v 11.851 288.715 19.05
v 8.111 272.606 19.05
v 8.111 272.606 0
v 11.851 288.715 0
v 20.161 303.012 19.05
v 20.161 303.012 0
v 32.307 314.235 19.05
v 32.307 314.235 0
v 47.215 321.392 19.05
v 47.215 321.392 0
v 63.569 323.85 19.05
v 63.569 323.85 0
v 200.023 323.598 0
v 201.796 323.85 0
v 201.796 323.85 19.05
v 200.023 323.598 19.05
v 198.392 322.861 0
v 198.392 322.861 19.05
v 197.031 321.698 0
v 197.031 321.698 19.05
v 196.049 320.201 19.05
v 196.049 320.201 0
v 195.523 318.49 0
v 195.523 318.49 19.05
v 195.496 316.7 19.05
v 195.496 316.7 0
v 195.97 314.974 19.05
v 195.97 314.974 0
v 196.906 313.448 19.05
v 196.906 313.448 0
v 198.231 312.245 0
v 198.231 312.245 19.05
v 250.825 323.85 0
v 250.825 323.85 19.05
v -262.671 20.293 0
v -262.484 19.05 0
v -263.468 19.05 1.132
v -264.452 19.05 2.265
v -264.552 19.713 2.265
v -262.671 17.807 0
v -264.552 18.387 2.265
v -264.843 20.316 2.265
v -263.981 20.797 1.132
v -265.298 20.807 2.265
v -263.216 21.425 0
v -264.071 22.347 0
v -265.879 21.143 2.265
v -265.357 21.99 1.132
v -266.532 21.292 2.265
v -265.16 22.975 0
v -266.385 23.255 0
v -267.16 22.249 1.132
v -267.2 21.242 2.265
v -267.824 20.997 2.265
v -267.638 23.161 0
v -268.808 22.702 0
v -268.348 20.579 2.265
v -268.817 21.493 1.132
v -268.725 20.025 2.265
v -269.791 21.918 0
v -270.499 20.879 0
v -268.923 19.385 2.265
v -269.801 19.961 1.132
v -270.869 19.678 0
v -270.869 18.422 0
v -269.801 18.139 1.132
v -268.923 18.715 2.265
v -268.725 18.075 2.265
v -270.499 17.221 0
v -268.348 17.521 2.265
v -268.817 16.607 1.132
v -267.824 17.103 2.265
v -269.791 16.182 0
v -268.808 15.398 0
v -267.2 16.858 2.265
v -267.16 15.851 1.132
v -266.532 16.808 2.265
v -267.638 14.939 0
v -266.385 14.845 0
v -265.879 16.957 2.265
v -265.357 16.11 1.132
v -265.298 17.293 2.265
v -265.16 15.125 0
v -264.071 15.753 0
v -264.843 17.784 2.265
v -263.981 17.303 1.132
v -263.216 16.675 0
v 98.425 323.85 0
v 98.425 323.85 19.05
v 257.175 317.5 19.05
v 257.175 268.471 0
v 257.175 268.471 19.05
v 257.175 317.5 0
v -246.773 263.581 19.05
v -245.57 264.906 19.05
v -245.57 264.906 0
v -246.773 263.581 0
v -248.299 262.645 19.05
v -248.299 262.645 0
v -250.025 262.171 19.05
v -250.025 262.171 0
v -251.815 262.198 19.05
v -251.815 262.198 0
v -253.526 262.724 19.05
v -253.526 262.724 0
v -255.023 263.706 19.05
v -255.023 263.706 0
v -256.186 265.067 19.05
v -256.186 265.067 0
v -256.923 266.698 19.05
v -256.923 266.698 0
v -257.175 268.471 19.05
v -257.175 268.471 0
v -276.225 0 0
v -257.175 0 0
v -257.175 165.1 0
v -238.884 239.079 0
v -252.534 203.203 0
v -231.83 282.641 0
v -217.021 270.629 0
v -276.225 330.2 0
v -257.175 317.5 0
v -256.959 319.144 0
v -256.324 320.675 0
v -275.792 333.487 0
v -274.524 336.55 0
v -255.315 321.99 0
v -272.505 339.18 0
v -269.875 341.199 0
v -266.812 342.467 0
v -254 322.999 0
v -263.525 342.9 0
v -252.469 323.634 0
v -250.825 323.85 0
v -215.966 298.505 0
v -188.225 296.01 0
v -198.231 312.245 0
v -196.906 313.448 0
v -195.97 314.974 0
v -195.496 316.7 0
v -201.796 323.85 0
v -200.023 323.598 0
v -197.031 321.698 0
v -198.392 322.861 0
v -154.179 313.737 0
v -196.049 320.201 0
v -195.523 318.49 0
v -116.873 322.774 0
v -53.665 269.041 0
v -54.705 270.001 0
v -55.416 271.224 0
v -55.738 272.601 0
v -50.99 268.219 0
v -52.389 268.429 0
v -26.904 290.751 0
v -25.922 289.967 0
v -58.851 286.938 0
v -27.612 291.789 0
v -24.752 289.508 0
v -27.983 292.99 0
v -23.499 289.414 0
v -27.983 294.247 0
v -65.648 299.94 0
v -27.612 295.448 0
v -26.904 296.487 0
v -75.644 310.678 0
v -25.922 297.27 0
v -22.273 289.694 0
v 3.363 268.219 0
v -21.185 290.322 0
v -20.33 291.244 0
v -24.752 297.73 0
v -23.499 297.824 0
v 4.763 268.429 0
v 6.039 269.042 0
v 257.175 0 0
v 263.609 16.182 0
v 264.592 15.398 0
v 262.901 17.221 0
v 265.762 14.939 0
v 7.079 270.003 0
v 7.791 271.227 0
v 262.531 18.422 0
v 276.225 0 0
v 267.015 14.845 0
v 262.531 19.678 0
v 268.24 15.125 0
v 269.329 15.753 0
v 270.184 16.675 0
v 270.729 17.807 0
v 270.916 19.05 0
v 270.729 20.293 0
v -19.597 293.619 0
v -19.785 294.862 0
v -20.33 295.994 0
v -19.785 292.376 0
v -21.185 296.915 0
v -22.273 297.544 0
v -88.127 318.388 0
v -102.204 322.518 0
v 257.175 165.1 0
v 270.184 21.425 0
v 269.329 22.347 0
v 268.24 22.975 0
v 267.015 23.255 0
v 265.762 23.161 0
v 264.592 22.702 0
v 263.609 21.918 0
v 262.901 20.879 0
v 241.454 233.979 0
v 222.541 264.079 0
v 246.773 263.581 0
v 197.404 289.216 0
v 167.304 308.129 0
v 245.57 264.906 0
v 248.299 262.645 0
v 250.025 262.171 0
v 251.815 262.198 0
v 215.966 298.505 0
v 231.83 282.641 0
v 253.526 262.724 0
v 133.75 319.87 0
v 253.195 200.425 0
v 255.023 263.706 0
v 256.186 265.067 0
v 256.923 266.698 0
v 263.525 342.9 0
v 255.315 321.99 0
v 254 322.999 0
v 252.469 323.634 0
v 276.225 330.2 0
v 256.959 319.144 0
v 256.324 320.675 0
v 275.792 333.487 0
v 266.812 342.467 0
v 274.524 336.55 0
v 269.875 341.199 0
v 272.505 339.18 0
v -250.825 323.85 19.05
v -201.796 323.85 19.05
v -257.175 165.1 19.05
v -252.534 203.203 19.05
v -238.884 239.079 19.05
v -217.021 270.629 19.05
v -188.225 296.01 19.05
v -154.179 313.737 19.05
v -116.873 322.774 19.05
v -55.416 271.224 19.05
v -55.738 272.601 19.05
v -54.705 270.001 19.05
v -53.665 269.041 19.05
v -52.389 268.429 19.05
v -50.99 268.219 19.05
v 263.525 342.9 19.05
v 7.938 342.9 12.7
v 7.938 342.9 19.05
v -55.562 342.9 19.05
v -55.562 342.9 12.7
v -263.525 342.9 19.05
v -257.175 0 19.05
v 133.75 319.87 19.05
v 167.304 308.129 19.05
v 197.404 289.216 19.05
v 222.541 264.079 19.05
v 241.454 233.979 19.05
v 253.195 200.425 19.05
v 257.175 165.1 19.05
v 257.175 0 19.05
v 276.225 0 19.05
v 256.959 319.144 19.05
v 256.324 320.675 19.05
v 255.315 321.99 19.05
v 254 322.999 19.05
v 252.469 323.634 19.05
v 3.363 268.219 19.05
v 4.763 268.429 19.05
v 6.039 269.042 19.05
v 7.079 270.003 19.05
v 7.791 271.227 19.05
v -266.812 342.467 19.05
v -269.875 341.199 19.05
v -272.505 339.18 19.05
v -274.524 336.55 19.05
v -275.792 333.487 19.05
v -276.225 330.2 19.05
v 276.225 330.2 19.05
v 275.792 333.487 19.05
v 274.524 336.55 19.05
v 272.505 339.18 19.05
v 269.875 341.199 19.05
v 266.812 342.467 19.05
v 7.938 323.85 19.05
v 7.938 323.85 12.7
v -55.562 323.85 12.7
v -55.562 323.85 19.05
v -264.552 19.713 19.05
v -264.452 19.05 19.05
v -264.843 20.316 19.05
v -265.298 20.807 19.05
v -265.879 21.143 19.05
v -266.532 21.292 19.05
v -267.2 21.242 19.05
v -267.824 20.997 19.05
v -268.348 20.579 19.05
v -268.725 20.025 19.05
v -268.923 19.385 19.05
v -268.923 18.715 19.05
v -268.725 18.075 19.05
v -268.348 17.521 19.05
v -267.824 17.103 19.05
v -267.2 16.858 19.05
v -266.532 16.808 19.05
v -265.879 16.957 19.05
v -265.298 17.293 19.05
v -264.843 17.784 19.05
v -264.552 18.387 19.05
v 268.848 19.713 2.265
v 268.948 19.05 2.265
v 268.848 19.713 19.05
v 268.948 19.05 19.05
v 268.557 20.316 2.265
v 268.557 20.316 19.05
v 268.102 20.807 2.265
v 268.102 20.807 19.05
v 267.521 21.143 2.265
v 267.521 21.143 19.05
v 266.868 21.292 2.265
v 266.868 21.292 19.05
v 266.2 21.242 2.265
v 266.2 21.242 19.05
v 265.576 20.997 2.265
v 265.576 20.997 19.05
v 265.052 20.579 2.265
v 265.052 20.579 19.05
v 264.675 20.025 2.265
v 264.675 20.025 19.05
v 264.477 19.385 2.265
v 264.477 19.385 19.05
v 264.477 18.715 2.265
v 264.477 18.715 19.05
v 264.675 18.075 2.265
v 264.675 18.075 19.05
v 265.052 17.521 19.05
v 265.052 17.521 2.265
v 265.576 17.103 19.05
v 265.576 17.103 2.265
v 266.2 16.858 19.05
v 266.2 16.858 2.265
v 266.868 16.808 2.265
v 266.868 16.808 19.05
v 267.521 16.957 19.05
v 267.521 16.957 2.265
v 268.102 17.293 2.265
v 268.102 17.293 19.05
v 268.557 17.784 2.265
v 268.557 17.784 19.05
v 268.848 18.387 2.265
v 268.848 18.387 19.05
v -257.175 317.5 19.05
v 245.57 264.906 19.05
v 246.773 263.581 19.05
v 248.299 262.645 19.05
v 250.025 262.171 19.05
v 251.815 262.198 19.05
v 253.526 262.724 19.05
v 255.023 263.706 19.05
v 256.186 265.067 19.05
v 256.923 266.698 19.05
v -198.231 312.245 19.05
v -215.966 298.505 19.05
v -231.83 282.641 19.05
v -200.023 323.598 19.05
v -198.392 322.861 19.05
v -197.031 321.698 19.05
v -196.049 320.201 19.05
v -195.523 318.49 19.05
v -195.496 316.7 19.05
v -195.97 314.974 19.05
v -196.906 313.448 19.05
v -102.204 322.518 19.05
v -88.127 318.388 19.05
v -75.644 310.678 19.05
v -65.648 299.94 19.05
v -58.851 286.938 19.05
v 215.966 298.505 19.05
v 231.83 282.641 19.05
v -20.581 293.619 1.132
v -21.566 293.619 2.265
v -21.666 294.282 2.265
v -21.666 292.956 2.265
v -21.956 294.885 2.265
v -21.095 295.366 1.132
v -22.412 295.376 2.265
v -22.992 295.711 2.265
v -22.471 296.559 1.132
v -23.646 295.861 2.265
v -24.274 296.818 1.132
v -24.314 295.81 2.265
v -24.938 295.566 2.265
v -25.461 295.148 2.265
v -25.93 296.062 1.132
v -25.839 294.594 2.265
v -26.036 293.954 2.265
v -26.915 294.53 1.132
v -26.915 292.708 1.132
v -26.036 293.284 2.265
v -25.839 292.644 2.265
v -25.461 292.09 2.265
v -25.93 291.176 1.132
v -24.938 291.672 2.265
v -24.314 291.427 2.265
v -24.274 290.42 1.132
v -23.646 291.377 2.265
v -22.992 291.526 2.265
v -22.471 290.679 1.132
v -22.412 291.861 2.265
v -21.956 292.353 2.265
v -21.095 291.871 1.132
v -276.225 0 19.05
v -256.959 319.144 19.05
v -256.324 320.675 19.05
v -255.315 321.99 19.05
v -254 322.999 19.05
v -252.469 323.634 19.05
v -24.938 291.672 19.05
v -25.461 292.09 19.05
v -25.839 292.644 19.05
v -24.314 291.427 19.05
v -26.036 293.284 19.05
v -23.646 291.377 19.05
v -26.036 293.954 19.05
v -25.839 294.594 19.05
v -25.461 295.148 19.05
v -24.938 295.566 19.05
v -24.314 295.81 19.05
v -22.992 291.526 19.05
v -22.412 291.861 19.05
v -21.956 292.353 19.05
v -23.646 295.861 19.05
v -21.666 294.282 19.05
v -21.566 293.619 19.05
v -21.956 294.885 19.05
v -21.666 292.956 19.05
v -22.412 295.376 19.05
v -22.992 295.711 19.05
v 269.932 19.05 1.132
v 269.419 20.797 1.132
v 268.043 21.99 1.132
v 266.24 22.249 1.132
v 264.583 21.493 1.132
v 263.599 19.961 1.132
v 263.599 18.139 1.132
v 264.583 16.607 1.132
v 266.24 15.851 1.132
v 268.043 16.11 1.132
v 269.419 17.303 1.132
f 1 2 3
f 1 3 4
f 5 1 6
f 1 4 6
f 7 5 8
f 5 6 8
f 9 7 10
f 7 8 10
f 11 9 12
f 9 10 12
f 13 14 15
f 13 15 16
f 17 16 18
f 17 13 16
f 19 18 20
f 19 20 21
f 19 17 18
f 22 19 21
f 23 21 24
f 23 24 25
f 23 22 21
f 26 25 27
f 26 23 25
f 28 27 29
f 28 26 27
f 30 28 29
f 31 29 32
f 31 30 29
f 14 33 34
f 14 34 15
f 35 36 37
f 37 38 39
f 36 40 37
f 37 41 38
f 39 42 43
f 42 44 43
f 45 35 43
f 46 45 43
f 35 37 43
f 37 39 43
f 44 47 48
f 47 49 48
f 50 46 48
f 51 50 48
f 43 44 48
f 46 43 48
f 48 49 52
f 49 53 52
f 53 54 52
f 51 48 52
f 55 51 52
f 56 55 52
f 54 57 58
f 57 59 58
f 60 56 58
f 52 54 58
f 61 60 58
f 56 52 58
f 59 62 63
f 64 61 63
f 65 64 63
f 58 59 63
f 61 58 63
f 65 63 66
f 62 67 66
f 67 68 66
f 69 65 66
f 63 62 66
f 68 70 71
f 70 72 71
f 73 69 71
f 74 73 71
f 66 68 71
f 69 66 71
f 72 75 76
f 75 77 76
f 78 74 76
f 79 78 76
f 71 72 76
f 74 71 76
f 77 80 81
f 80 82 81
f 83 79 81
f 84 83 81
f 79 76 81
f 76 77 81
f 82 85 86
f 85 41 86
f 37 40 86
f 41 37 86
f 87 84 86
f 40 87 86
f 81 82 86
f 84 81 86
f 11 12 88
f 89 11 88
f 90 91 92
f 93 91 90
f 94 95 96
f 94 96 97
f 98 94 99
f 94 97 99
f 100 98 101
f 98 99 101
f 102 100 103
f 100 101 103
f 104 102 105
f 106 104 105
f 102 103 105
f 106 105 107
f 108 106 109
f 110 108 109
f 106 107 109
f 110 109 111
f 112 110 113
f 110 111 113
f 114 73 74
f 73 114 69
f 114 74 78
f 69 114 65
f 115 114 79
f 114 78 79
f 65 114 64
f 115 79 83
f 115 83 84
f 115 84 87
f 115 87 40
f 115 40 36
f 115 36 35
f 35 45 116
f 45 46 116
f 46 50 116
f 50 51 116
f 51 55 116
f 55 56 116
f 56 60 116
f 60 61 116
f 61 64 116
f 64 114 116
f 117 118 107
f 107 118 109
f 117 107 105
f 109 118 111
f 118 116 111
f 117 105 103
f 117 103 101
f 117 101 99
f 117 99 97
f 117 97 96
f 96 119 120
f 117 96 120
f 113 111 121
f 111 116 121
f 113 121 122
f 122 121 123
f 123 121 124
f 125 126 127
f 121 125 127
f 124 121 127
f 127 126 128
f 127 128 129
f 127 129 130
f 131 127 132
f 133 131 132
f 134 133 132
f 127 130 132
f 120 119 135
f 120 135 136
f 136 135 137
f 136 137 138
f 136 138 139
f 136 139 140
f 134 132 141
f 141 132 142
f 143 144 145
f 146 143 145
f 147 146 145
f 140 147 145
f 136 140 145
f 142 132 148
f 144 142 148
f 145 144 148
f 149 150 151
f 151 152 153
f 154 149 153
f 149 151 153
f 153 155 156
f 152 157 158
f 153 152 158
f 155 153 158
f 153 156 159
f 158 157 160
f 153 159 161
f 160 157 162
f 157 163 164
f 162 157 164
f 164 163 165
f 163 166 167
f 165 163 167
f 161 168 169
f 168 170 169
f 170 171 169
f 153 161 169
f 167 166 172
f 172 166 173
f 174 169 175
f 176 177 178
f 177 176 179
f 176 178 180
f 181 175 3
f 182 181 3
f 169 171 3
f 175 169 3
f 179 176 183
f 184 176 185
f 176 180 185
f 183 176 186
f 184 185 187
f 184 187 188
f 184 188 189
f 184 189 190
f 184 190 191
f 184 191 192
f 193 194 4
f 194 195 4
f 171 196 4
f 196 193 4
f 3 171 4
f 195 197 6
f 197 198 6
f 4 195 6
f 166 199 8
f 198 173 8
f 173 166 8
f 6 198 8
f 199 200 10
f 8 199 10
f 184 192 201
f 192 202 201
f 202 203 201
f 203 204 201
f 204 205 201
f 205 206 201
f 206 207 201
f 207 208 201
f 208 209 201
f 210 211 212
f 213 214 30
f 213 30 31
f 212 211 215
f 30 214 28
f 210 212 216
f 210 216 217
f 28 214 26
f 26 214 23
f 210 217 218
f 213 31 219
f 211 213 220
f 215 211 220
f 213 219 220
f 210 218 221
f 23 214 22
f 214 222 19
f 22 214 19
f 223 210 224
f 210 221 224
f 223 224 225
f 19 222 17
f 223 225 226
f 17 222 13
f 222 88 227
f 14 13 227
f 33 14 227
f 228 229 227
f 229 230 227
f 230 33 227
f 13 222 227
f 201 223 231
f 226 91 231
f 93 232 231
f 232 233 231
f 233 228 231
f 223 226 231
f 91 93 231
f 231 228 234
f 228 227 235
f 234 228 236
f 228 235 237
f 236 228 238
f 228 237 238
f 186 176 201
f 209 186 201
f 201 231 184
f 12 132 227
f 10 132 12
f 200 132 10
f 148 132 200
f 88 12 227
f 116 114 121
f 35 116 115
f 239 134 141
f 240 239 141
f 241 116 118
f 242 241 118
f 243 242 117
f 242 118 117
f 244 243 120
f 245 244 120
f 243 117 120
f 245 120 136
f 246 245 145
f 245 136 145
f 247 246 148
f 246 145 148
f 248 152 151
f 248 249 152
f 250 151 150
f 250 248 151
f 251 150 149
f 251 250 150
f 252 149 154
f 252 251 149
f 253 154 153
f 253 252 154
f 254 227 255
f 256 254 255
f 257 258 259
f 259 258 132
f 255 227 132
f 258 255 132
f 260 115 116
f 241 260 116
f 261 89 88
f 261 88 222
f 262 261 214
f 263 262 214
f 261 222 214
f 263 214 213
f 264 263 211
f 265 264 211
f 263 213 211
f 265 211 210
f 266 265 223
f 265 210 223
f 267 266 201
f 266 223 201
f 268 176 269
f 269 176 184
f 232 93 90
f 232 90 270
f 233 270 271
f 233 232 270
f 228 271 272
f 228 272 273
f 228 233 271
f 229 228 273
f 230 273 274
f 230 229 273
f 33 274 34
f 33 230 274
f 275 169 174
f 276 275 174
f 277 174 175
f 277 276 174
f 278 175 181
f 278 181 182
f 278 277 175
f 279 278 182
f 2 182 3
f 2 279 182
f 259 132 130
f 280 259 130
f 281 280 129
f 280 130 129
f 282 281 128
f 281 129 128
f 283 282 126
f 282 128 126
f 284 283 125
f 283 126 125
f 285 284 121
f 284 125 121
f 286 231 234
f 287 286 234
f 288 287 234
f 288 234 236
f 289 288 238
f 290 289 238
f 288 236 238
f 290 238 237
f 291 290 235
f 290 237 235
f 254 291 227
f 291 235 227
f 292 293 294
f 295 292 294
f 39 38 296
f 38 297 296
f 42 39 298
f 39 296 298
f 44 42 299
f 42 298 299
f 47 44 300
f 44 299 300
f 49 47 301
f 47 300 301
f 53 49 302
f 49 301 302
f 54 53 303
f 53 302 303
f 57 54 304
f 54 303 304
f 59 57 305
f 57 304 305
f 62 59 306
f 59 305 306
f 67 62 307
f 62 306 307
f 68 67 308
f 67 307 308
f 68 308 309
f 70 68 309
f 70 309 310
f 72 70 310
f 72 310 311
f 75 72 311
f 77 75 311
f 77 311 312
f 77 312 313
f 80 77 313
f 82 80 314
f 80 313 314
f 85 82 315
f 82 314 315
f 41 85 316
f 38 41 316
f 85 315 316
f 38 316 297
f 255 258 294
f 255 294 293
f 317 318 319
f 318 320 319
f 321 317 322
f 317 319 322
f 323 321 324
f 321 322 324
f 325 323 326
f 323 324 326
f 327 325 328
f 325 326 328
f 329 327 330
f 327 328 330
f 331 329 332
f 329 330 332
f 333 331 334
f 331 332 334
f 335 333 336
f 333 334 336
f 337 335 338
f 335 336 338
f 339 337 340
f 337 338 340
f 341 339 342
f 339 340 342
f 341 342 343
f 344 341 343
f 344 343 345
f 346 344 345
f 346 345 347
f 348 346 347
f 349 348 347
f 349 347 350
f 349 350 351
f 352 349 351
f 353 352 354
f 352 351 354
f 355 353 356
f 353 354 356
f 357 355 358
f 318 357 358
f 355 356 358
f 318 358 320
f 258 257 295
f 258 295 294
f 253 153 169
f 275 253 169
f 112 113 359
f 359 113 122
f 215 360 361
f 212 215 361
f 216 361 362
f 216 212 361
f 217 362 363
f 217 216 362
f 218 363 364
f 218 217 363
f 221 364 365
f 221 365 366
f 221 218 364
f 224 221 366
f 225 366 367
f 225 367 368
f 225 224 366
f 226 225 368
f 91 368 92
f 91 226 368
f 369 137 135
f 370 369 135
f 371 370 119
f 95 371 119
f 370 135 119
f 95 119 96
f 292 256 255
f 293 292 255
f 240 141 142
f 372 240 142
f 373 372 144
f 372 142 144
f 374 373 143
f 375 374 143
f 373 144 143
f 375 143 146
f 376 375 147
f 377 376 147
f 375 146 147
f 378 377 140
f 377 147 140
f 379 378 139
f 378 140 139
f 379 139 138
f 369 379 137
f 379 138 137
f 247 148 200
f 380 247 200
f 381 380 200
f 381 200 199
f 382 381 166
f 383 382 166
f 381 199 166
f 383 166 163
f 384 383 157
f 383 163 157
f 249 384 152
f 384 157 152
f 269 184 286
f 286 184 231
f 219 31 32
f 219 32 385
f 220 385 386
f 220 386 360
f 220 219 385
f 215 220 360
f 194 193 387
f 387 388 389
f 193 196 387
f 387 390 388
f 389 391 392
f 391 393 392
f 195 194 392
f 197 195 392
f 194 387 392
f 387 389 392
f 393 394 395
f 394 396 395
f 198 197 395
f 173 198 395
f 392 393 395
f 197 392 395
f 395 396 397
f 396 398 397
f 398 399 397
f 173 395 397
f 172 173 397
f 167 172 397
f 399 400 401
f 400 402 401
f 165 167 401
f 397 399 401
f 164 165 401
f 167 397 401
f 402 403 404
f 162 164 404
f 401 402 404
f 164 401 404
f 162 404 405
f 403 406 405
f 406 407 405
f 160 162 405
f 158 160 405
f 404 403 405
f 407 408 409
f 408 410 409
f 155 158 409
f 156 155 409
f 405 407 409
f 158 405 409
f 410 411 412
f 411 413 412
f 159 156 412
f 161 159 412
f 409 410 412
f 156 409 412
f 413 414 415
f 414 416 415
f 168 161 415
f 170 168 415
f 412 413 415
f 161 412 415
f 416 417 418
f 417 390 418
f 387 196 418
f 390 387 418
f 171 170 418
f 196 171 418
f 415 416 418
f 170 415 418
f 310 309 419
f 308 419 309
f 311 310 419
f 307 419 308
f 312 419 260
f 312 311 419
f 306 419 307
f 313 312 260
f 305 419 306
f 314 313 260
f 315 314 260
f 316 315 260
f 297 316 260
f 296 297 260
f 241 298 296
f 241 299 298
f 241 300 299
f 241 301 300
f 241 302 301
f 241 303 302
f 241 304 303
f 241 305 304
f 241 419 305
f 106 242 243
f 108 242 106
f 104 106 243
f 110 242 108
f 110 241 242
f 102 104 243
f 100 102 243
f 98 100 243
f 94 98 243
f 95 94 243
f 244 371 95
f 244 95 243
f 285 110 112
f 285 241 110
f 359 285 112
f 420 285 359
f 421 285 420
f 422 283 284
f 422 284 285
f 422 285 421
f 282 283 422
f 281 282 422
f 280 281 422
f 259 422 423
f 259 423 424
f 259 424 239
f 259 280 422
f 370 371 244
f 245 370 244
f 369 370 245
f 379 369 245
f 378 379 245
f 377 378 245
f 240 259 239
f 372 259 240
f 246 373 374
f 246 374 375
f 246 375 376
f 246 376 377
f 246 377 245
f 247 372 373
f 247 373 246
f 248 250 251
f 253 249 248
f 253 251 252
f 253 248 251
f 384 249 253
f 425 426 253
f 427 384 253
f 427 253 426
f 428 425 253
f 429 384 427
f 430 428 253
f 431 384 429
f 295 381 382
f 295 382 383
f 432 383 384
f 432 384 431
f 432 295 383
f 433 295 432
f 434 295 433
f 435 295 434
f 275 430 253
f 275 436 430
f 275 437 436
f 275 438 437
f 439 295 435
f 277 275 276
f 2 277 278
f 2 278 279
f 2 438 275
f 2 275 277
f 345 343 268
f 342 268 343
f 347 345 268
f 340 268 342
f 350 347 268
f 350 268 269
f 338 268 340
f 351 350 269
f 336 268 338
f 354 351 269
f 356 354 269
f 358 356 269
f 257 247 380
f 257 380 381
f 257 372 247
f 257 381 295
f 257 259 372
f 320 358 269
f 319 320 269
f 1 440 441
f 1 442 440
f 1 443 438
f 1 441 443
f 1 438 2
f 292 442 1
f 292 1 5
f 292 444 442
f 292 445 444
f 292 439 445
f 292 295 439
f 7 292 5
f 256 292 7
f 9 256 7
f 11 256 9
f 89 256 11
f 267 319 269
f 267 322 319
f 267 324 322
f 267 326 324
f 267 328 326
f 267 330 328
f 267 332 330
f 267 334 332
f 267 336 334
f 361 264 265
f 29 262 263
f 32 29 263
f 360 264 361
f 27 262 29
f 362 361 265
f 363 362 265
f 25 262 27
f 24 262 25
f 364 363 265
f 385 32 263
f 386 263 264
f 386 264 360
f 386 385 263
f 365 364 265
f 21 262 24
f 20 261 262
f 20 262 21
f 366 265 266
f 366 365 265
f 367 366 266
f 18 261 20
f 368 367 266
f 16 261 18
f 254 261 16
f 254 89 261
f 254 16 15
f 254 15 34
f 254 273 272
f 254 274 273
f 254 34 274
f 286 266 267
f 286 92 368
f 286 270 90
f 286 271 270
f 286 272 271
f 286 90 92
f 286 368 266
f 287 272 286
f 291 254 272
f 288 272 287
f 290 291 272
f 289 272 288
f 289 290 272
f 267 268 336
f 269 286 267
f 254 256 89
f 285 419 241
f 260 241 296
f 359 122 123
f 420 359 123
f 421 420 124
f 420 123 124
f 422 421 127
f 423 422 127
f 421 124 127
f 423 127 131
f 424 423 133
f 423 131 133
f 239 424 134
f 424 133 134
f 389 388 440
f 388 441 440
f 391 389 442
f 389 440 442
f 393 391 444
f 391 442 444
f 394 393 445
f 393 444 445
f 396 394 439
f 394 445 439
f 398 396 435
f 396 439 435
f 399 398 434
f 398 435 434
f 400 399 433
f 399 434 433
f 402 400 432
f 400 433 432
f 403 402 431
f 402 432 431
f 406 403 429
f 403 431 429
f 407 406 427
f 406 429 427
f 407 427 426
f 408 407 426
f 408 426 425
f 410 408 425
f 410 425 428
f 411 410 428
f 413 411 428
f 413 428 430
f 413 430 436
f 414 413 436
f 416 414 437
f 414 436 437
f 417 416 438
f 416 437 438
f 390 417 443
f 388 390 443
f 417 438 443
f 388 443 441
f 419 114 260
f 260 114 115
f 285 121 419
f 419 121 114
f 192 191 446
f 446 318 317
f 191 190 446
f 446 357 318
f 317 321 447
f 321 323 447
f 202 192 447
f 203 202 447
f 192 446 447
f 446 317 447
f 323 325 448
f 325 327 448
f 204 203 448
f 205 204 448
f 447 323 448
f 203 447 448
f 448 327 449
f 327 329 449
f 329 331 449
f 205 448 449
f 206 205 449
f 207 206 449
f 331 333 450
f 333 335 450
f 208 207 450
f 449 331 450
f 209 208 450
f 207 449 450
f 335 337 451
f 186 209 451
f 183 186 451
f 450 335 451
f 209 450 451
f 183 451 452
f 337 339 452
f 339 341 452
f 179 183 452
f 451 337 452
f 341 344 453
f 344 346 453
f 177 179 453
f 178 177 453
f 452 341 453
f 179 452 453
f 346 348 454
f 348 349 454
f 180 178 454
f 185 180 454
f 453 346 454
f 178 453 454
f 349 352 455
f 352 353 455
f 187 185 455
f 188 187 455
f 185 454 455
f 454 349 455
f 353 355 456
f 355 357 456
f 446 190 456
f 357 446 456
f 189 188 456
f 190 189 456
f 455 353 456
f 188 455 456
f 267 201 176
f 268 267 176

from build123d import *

# Parameters (mm, degrees)
BOSS_EXTRUDE1_DEPTH                            = 19.05
SKETCH2_W                                      = 63.5
SKETCH2_H                                      = 6.35
CUT_EXTRUDE1_DEPTH                             = 441.730714978
BOSS_EXTRUDE3_DEPTH                            = 19.05
FILLET1_R                                      = 4.7625
CSK_FOR_8_FLAT_HEAD_MACHINE_SCREW1_D           = 4.4958
CSK_FOR_8_FLAT_HEAD_MACHINE_SCREW1_DEPTH       = 30.1752
CSK_FOR_8_FLAT_HEAD_MACHINE_SCREW1_CSINK_D     = 8.4328
CSK_FOR_8_FLAT_HEAD_MACHINE_SCREW1_CSINK_ANGLE = 82
CSK_FOR_8_FLAT_HEAD_MACHINE_SCREW1_TIP         = 1.350674586


with BuildPart() as part:
    # Sketch1 → Boss-Extrude1 (new body)
    with BuildSketch(Plane.XY):
        with BuildLine():
            Line((276.225, 0), (276.225, 330.2))
            ThreePointArc((276.225, 330.2), (272.505256121, 339.180256121), (263.525, 342.9))
            Line((263.525, 342.9), (-263.525, 342.9))
            ThreePointArc((-263.525, 342.9), (-272.505256121, 339.180256121), (-276.225, 330.2))
            Line((-276.225, 330.2), (-276.225, 0))
            Line((-276.225, 0), (-257.175, 0))
            Line((-257.175, 0), (-257.175, 76.2))
            Line((-257.175, 76.2), (-257.175, 165.1))
            ThreePointArc((-257.175, 165.1), (-210.678201513, 277.353201513), (-98.425, 323.85))
            Line((-98.425, 323.85), (98.425, 323.85))
            ThreePointArc((98.425, 323.85), (210.678201513, 277.353201513), (257.175, 165.1))
            Line((257.175, 165.1), (257.175, 76.2))
            Line((257.175, 76.2), (257.175, 0))
            Line((257.175, 0), (276.225, 0))
        make_face()
        with BuildLine():
            Line((250.825, 323.85), (201.795510785, 323.85))
            ThreePointArc((201.795510785, 323.85), (195.725385382, 319.364424197), (198.231010413, 312.244827586))
            ThreePointArc((198.231010413, 312.244827586), (224.148585695, 290.823585695), (245.569827586, 264.906010413))
            ThreePointArc((245.569827586, 264.906010413), (252.689424197, 262.400385382), (257.175, 268.470510785))
            Line((257.175, 268.470510785), (257.175, 317.5))
            ThreePointArc((257.175, 317.5), (255.315128061, 321.990128061), (250.825, 323.85))
        make_face(mode=Mode.SUBTRACT)
        with BuildLine():
            Line((-250.825, 323.85), (-201.795510785, 323.85))
            ThreePointArc((-201.795510785, 323.85), (-195.725385382, 319.364424197), (-198.231010413, 312.244827586))
            ThreePointArc((-198.231010413, 312.244827586), (-224.148585695, 290.823585695), (-245.569827586, 264.906010413))
            ThreePointArc((-245.569827586, 264.906010413), (-252.689424197, 262.400385382), (-257.175, 268.470510785))
            Line((-257.175, 268.470510785), (-257.175, 317.5))
            ThreePointArc((-257.175, 317.5), (-255.315128061, 321.990128061), (-250.825, 323.85))
        make_face(mode=Mode.SUBTRACT)
    extrude(amount=BOSS_EXTRUDE1_DEPTH)

    # Sketch2 → Cut-Extrude1 (cut, through all)
    with BuildSketch(Plane(origin=(0, 342.9, 0), x_dir=(1, 0, 0), z_dir=(0, 1, 0))):
        with Locations((-23.8125, -15.875)):
            Rectangle(SKETCH2_W, SKETCH2_H)
    extrude(amount=-CUT_EXTRUDE1_DEPTH, mode=Mode.SUBTRACT)

    # Sketch3 → Boss-Extrude3 (add)
    with BuildSketch(Plane.XY):
        with BuildLine():
            ThreePointArc((-116.873274525, 322.774422996), (-73.976886998, 309.253399344), (-55.5625, 268.21892))
            Line((-55.5625, 268.21892), (7.9375, 268.21892))
            ThreePointArc((7.9375, 268.21892), (24.231466087, 307.556033913), (63.56858, 323.85))
            Line((63.56858, 323.85), (7.9375, 323.85))
            Line((7.9375, 323.85), (-55.5625, 323.85))
            Line((-55.5625, 323.85), (-98.425, 323.85))
            ThreePointArc((-98.425, 323.85), (-107.664801119, 323.580877633), (-116.873274525, 322.774422996))
        make_face()
    extrude(amount=BOSS_EXTRUDE3_DEPTH)

    # Fillet1
    fillet1_edges = [part.edges().sort_by_distance(p)[0] for p in [
        (-55.5625, 268.21892, 9.525),
        (7.9375, 268.21892, 9.525),
    ]]
    fillet(fillet1_edges, radius=FILLET1_R)

    # CSK for #8 Flat Head Machine Screw1
    with Locations(Plane(origin=(0, 0, 0), x_dir=(-1, 0, 0), z_dir=(0, 0, -1))):
        with Locations((23.813611707, 293.61892), (266.7, 19.05), (-266.7, 19.05)):
            CounterSinkHole(CSK_FOR_8_FLAT_HEAD_MACHINE_SCREW1_D / 2, CSK_FOR_8_FLAT_HEAD_MACHINE_SCREW1_CSINK_D / 2, depth=CSK_FOR_8_FLAT_HEAD_MACHINE_SCREW1_DEPTH, counter_sink_angle=CSK_FOR_8_FLAT_HEAD_MACHINE_SCREW1_CSINK_ANGLE)
            with Locations((0, 0, -(CSK_FOR_8_FLAT_HEAD_MACHINE_SCREW1_DEPTH + CSK_FOR_8_FLAT_HEAD_MACHINE_SCREW1_TIP / 2))):  # 118° drill point
                Cone(0, CSK_FOR_8_FLAT_HEAD_MACHINE_SCREW1_D / 2, CSK_FOR_8_FLAT_HEAD_MACHINE_SCREW1_TIP, mode=Mode.SUBTRACT)


solid = part.part
